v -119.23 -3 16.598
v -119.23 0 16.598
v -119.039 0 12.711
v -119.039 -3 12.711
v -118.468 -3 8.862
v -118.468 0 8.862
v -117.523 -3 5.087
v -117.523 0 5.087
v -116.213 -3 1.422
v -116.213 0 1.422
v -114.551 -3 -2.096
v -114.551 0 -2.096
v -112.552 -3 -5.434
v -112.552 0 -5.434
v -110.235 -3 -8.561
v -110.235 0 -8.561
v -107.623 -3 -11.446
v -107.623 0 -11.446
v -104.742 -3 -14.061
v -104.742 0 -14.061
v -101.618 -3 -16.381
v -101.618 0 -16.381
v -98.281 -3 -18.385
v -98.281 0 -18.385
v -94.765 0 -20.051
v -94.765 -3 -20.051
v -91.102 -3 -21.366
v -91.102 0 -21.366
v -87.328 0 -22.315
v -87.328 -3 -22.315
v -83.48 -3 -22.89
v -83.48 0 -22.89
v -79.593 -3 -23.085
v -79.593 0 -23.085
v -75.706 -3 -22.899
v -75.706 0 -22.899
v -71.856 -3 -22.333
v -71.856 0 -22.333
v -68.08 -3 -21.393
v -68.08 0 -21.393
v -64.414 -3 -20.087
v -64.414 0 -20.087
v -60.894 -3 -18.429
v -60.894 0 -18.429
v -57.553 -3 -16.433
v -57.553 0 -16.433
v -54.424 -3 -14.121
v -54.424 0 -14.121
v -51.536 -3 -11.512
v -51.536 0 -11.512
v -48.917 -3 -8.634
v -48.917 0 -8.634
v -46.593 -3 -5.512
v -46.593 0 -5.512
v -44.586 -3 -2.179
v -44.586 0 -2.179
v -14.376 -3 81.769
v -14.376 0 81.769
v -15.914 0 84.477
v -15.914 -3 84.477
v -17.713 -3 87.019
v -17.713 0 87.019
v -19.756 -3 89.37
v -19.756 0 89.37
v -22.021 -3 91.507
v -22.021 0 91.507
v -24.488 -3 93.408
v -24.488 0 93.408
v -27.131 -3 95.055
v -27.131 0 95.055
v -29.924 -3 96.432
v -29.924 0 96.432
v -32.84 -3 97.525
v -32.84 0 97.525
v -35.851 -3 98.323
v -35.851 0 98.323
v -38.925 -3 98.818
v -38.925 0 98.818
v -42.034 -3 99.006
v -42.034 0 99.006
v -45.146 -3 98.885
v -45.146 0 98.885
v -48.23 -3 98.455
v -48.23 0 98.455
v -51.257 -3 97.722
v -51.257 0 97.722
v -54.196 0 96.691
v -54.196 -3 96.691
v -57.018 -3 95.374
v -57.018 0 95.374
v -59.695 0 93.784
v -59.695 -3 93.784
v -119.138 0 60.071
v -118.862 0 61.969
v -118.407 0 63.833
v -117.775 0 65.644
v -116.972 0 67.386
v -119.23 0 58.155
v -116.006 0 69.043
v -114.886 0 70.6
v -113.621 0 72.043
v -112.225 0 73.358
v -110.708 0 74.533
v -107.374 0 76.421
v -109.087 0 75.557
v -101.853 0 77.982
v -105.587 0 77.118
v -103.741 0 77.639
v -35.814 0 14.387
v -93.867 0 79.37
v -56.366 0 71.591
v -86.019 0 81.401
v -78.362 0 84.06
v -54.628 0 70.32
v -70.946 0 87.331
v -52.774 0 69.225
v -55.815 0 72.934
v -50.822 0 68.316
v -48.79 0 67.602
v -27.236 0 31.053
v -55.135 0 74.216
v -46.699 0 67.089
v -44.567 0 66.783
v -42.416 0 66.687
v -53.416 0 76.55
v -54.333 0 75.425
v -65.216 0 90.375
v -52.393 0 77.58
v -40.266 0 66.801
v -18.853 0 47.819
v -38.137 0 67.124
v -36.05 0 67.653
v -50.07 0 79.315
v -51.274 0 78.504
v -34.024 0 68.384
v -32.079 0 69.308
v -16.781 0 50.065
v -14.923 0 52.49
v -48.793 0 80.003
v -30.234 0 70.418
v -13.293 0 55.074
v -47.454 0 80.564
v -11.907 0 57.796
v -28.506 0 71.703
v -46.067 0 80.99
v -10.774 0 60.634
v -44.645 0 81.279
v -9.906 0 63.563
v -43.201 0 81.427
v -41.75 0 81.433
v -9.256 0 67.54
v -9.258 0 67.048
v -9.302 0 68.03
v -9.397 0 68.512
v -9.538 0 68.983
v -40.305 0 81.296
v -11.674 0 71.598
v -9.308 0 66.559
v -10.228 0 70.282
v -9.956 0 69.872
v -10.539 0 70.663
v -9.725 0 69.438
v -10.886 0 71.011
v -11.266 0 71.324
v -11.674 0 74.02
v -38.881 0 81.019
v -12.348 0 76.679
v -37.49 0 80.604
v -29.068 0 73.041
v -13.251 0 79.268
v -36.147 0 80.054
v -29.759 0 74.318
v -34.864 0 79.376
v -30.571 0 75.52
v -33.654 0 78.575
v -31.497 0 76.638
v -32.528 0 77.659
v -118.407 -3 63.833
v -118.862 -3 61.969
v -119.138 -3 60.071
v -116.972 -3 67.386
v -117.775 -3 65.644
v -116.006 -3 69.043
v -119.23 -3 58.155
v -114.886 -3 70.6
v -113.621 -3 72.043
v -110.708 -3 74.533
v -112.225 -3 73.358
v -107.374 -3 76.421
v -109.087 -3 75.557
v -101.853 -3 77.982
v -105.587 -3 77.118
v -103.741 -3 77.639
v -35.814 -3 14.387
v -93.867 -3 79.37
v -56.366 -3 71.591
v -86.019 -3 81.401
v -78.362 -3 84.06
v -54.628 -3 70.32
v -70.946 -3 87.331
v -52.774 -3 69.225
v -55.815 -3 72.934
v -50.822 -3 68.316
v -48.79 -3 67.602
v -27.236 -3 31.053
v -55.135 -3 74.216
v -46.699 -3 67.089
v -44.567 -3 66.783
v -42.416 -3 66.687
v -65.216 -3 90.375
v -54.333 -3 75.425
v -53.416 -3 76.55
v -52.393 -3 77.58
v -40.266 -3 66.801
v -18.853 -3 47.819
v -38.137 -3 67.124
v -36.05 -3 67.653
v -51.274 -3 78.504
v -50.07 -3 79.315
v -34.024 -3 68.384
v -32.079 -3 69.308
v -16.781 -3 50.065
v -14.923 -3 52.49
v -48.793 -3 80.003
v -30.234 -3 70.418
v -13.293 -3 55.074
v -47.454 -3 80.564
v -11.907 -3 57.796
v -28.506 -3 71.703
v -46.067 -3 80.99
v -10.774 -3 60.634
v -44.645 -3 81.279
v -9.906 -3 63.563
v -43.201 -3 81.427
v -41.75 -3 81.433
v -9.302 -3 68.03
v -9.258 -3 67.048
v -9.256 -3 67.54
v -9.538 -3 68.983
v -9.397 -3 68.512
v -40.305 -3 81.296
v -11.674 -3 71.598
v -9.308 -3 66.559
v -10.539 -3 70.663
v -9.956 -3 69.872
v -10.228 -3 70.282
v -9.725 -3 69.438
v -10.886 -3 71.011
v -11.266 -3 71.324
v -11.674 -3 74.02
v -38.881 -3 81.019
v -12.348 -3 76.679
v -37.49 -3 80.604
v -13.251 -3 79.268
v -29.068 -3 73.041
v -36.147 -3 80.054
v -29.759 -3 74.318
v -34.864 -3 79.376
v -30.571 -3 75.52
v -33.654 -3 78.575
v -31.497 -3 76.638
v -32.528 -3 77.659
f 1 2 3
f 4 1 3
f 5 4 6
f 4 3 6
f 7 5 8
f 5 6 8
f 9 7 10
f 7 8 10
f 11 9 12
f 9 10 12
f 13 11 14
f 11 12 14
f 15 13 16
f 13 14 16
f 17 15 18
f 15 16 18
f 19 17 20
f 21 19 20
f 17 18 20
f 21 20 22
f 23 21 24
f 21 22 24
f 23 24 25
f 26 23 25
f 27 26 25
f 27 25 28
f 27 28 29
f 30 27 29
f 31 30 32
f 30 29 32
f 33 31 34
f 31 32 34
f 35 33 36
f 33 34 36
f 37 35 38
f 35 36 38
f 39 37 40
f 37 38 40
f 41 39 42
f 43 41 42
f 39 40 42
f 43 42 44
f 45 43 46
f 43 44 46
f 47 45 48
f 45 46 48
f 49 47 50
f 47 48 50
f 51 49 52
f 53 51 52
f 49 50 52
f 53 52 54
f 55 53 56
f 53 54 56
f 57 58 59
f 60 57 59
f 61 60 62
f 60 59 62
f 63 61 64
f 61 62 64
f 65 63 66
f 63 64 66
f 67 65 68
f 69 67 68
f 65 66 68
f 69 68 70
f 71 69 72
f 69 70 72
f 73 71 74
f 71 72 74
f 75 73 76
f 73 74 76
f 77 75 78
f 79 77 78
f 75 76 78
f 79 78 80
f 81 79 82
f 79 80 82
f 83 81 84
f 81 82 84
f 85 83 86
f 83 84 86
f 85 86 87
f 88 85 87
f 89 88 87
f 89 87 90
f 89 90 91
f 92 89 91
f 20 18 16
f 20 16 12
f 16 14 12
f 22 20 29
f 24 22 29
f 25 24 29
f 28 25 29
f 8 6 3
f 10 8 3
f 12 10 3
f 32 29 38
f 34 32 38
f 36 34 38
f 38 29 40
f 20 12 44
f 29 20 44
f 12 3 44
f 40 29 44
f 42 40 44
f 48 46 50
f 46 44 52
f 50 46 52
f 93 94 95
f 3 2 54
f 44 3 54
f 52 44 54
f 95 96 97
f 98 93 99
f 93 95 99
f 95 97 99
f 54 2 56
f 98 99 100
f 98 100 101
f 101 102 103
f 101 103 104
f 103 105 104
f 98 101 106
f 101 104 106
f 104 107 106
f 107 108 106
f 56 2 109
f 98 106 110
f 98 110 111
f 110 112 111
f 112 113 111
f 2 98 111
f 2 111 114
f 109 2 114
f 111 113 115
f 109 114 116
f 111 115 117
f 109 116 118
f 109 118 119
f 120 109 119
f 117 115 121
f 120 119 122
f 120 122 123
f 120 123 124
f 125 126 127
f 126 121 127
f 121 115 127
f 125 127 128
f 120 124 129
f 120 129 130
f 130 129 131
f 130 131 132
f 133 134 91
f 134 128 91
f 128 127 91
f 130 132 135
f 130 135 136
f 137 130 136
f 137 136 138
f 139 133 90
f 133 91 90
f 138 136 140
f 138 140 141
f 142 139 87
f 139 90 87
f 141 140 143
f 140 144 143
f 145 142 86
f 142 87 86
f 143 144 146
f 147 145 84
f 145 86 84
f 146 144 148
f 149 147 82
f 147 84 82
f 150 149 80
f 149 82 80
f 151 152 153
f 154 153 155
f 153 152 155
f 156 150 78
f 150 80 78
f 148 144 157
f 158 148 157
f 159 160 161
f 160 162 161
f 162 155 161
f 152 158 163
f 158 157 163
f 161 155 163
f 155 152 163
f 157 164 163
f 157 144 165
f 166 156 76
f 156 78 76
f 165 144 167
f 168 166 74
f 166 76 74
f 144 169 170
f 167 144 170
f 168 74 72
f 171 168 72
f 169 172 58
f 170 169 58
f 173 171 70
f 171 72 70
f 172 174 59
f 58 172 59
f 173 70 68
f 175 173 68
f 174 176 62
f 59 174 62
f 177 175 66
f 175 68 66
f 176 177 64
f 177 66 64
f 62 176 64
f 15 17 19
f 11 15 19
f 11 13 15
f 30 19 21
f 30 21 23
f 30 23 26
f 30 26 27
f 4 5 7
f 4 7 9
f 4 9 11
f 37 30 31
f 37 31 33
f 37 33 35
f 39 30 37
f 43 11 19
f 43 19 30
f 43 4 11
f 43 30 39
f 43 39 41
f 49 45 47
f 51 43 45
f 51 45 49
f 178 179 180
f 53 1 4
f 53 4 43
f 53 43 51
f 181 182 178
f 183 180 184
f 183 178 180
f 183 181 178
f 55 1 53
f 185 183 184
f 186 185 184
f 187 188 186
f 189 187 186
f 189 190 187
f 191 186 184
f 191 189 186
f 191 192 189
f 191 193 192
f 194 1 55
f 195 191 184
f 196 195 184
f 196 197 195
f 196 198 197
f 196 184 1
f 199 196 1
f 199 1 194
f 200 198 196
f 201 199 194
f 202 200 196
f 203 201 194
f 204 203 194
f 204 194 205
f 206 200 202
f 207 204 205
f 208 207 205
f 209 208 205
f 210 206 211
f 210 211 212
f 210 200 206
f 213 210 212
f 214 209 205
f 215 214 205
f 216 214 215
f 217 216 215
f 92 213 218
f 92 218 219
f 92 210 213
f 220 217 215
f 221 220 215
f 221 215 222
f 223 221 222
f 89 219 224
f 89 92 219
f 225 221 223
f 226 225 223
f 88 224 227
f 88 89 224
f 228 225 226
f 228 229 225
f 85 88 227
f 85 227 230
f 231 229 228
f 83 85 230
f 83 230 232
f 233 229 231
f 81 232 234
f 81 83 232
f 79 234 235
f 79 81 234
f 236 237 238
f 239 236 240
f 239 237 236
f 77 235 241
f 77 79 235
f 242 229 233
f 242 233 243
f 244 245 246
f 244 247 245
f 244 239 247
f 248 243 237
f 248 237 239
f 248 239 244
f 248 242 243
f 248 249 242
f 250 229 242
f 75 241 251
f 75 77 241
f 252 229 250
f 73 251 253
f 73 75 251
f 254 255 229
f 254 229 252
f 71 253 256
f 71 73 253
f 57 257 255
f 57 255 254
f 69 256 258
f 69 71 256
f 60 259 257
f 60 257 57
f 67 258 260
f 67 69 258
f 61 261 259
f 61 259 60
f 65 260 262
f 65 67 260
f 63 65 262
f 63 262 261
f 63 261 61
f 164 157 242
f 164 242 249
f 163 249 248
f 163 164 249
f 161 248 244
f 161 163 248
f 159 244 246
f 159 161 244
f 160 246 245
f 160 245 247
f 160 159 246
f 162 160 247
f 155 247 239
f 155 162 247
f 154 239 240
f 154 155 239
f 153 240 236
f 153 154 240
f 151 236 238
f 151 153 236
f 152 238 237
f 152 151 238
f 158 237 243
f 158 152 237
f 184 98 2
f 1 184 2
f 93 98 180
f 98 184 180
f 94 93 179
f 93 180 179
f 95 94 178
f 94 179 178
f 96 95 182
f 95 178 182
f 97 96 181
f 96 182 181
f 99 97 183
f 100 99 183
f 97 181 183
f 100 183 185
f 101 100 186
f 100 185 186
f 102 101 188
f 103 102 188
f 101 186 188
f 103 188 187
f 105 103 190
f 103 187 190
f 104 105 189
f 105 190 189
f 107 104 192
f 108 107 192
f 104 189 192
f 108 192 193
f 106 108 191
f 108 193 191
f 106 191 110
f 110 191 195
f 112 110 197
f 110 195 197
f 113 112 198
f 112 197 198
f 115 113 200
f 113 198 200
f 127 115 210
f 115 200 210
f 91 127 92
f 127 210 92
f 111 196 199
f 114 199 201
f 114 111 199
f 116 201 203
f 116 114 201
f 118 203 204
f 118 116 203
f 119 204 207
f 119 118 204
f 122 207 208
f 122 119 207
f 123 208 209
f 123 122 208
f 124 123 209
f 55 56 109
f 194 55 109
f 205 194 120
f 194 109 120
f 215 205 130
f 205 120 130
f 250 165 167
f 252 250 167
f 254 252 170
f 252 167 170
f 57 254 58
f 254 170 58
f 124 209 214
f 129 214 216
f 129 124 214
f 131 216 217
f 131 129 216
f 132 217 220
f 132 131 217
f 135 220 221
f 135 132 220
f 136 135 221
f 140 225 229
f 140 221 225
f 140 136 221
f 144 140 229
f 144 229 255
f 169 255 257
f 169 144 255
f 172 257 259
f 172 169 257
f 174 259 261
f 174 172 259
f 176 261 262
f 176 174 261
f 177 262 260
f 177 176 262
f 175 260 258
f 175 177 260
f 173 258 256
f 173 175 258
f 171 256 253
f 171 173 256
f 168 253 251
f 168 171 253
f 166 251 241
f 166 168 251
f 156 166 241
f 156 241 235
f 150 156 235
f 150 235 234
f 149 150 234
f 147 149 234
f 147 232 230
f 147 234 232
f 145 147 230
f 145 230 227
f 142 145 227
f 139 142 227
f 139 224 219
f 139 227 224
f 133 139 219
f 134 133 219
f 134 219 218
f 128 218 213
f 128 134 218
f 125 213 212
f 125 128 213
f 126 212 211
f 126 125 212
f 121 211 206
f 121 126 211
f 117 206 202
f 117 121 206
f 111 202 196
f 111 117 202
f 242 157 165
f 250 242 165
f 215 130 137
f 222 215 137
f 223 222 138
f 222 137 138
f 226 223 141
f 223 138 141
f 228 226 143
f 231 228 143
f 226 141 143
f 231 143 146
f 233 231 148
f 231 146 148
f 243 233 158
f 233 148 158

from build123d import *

# Parameters (mm, degrees)
F1_DEPTH    = 3
F2_DEPTH    = 25
F3_R        = 20
F4_R        = 100
F5_T1_DEPTH = 28.2643660281


# Not quite as in the source:
# - a fillet or chamfer that OpenCascade refuses, or shapes differently, is made with other operations: its cross-section is extruded or revolved along the edge and cut away or added


with BuildPart() as f1:
    # F0 (on Front) → F1 (new body)
    with BuildSketch(Plane.XZ):
        with BuildLine():
            ThreePointArc((-119.2295857728, 16.5976797057), (-89.2269882152, -21.8866064143), (-44.5863344816, -2.1785326218))
            ThreePointArc((-44.5863344816, -2.1785326218), (-31.5003837254, 22.7075657451), (-18.8527258188, 47.819251244))
            ThreePointArc((-18.8527258188, 47.819251244), (-11.5073907558, 58.7139707042), (-8.9261215756, 71.5975225718))
            Line((-8.9261215756, 71.5975225718), (-11.67442069, 71.5975225718))
            Line((-11.67442069, 71.5975225718), (-11.67442069, 74.0203762137))
            ThreePointArc((-11.67442069, 74.0203762137), (-12.7707106261, 77.9833199576), (-14.3762885703, 81.7686725444))
            ThreePointArc((-14.3762885703, 81.7686725444), (-44.33377908, 98.9465167224), (-71.9061774941, 78.1548738354))
            Line((-71.9061774941, 78.1548738354), (-107.2845857728, 78.1548738354))
            Line((-107.2845857728, 78.1548738354), (-119.2295857728, 78.1548738354))
            Line((-119.2295857728, 78.1548738354), (-119.2295857728, 66.2098738354))
            Line((-119.2295857728, 66.2098738354), (-119.2295857728, 16.5976797057))
        make_face()
        with BuildLine():
            ThreePointArc((-26.6928125913, 79.0930187933), (-24.6315082315, 75.5227380173), (-23.3711215756, 71.597523888))
            Line((-23.3711215756, 71.597523888), (-20.8711215756, 71.5975236602))
            ThreePointArc((-20.8711215756, 71.5975236602), (-22.8939959961, 62.4935676044), (-28.5819229469, 55.1029300277))
            ThreePointArc((-28.5819229469, 55.1029300277), (-41.6104278008, 29.1671780434), (-55.1096433175, 3.4732809051))
            ThreePointArc((-55.1096433175, 3.4732809051), (-86.3130475025, -10.3024804429), (-107.2845857728, 16.5976797057))
            Line((-107.2845857728, 16.5976797057), (-107.2845857728, 66.2098738354))
            Line((-107.2845857728, 66.2098738354), (-104.7845857728, 66.2098738354))
            Line((-104.7845857728, 66.2098738354), (-68.5864427672, 66.2098738354))
            Line((-68.5864427672, 66.2098738354), (-63.1803487139, 66.2098738354))
            ThreePointArc((-63.1803487139, 66.2098738354), (-63.6941147242, 68.8812286524), (-63.8664115811, 71.5960777945))
            Line((-63.8664115811, 71.5960777945), (-61.3664115868, 71.5962461647))
            ThreePointArc((-61.3664115868, 71.5962461647), (-46.4685424734, 86.625019162), (-26.6928125913, 79.0930187933))
        make_face(mode=Mode.SUBTRACT)
        with BuildLine():
            ThreePointArc((-32.7025071715, 52.3956462756), (-51.243606048, 52.0172813271), (-63.1803487139, 66.2098738354))
            Line((-63.1803487139, 66.2098738354), (-68.5864427672, 66.2098738354))
            Line((-68.5864427672, 66.2098738354), (-104.7845857728, 66.2098738354))
            Line((-104.7845857728, 66.2098738354), (-104.7845857728, 16.5976797057))
            ThreePointArc((-104.7845857728, 16.5976797057), (-85.7031813006, -7.8780087034), (-57.3120938901, 4.6561636023))
            ThreePointArc((-57.3120938901, 4.6561636023), (-44.8056231456, 28.4219407394), (-32.7025071715, 52.3956462756))
        make_face()
        with BuildLine():
            ThreePointArc((-61.3664115868, 71.5962461647), (-42.368127741, 52.5998806027), (-23.3711215756, 71.597523888))
            Line((-23.3711215756, 71.597523888), (-28.5062876117, 71.7030383349))
            ThreePointArc((-28.5062876117, 71.7030383348), (-35.0280474509, 67.9936357913), (-42.4162418184, 66.6868830916))
            ThreePointArc((-42.4162418184, 66.6868830916), (-49.8149115034, 67.9342855665), (-56.3664115866, 71.5913571683))
            Line((-56.3664115866, 71.5913571683), (-61.3664115868, 71.5962461647))
        make_face()
        with BuildLine():
            ThreePointArc((-55.1096433175, 3.4732809051), (-41.6104278008, 29.1671780434), (-28.5819229469, 55.1029300277))
            ThreePointArc((-28.5819229469, 55.1029300277), (-30.5643455059, 53.6307678626), (-32.7025071715, 52.3956462756))
            ThreePointArc((-32.7025071715, 52.3956462756), (-44.8056231456, 28.4219407394), (-57.3120938901, 4.6561636023))
            ThreePointArc((-57.3120938901, 4.6561636023), (-85.7031813006, -7.8780087034), (-104.7845857728, 16.5976797057))
            Line((-104.7845857728, 16.5976797057), (-104.7845857728, 66.2098738354))
            Line((-104.7845857728, 66.2098738354), (-107.2845857728, 66.2098738354))
            Line((-107.2845857728, 66.2098738354), (-107.2845857728, 16.5976797057))
            ThreePointArc((-107.2845857728, 16.5976797057), (-86.3130475025, -10.3024804429), (-55.1096433175, 3.4732809051))
        make_face()
        with BuildLine():
            ThreePointArc((-42.4162418184, 66.6868830916), (-35.0280474509, 67.9936357913), (-28.5062876117, 71.7030383348))
            ThreePointArc((-28.5062876117, 71.7030383349), (-42.4756351565, 81.447422187), (-56.3664115866, 71.5913571683))
            ThreePointArc((-56.3664115866, 71.5913571683), (-49.8149115034, 67.9342855665), (-42.4162418184, 66.6868830916))
        make_face()
        with BuildLine():
            Line((-28.5062876117, 71.7030383349), (-23.3711215756, 71.597523888))
            ThreePointArc((-23.3711215756, 71.597523888), (-24.6315082315, 75.5227380173), (-26.6928125913, 79.0930187933))
            ThreePointArc((-26.6928125913, 79.0930187933), (-46.4685424734, 86.625019162), (-61.3664115868, 71.5962461647))
            Line((-61.3664115868, 71.5962461647), (-56.3664115866, 71.5913571683))
            ThreePointArc((-56.3664115866, 71.5913571683), (-42.4756351565, 81.447422187), (-28.5062876117, 71.7030383349))
        make_face()
        with BuildLine():
            Line((-20.8711215756, 71.5975236602), (-23.3711215756, 71.597523888))
            ThreePointArc((-23.3711215756, 71.597523888), (-42.368127741, 52.5998806027), (-61.3664115868, 71.5962461647))
            Line((-61.3664115868, 71.5962461647), (-63.8664115811, 71.5960777945))
            ThreePointArc((-63.8664115811, 71.5960777945), (-63.6941147242, 68.8812286524), (-63.1803487139, 66.2098738354))
            ThreePointArc((-63.1803487139, 66.2098738354), (-51.243606048, 52.0172813271), (-32.7025071715, 52.3956462756))
            ThreePointArc((-32.7025071715, 52.3956462756), (-30.5643455059, 53.6307678626), (-28.5819229469, 55.1029300277))
            ThreePointArc((-28.5819229469, 55.1029300277), (-22.8939959961, 62.4935676044), (-20.8711215756, 71.5975236602))
        make_face()
    extrude(amount=F1_DEPTH)

    # F0 (on Front) → F2 (cut)
    with BuildSketch(Plane.XZ):
        with BuildLine():
            ThreePointArc((-42.4162418184, 66.6868830916), (-35.0280474509, 67.9936357913), (-28.5062876117, 71.7030383348))
            ThreePointArc((-28.5062876117, 71.7030383349), (-42.4756351565, 81.447422187), (-56.3664115866, 71.5913571683))
            ThreePointArc((-56.3664115866, 71.5913571683), (-49.8149115034, 67.9342855665), (-42.4162418184, 66.6868830916))
        make_face()
    extrude(amount=F2_DEPTH, mode=Mode.SUBTRACT)

    # F3
    f3_edges = [f1.edges().sort_by_distance(p)[0] for p in [
        (-119.229586, -1.5, 78.154874),
    ]]
    fillet(f3_edges, radius=F3_R)

    # F4
    f4_edges = [f1.edges().sort_by_distance(p)[0] for p in [
        (-71.906177, -1.5, 78.154874),
    ]]
    fillet(f4_edges, radius=F4_R)

    # F5: fillet of radius 5 on 1 edges, made by hand

    # F5_s2 → F5_t1 (cut)
    with BuildSketch(Plane.XZ.offset(-12.632183014)):
        with BuildLine():
            ThreePointArc((-11.67442069, 71.5975225718), (-9.7251397256, 69.4380959712), (-9.3078431517, 66.5590886613))
            ThreePointArc((-9.3078431517, 66.5590886613), (-9.0216886325, 69.0710859777), (-8.9261215756, 71.5975225718))
            Line((-8.9261215756, 71.5975225718), (-11.67442069, 71.5975225718))
        make_face()
    extrude(amount=F5_T1_DEPTH, mode=Mode.SUBTRACT)


solid = f1.part
